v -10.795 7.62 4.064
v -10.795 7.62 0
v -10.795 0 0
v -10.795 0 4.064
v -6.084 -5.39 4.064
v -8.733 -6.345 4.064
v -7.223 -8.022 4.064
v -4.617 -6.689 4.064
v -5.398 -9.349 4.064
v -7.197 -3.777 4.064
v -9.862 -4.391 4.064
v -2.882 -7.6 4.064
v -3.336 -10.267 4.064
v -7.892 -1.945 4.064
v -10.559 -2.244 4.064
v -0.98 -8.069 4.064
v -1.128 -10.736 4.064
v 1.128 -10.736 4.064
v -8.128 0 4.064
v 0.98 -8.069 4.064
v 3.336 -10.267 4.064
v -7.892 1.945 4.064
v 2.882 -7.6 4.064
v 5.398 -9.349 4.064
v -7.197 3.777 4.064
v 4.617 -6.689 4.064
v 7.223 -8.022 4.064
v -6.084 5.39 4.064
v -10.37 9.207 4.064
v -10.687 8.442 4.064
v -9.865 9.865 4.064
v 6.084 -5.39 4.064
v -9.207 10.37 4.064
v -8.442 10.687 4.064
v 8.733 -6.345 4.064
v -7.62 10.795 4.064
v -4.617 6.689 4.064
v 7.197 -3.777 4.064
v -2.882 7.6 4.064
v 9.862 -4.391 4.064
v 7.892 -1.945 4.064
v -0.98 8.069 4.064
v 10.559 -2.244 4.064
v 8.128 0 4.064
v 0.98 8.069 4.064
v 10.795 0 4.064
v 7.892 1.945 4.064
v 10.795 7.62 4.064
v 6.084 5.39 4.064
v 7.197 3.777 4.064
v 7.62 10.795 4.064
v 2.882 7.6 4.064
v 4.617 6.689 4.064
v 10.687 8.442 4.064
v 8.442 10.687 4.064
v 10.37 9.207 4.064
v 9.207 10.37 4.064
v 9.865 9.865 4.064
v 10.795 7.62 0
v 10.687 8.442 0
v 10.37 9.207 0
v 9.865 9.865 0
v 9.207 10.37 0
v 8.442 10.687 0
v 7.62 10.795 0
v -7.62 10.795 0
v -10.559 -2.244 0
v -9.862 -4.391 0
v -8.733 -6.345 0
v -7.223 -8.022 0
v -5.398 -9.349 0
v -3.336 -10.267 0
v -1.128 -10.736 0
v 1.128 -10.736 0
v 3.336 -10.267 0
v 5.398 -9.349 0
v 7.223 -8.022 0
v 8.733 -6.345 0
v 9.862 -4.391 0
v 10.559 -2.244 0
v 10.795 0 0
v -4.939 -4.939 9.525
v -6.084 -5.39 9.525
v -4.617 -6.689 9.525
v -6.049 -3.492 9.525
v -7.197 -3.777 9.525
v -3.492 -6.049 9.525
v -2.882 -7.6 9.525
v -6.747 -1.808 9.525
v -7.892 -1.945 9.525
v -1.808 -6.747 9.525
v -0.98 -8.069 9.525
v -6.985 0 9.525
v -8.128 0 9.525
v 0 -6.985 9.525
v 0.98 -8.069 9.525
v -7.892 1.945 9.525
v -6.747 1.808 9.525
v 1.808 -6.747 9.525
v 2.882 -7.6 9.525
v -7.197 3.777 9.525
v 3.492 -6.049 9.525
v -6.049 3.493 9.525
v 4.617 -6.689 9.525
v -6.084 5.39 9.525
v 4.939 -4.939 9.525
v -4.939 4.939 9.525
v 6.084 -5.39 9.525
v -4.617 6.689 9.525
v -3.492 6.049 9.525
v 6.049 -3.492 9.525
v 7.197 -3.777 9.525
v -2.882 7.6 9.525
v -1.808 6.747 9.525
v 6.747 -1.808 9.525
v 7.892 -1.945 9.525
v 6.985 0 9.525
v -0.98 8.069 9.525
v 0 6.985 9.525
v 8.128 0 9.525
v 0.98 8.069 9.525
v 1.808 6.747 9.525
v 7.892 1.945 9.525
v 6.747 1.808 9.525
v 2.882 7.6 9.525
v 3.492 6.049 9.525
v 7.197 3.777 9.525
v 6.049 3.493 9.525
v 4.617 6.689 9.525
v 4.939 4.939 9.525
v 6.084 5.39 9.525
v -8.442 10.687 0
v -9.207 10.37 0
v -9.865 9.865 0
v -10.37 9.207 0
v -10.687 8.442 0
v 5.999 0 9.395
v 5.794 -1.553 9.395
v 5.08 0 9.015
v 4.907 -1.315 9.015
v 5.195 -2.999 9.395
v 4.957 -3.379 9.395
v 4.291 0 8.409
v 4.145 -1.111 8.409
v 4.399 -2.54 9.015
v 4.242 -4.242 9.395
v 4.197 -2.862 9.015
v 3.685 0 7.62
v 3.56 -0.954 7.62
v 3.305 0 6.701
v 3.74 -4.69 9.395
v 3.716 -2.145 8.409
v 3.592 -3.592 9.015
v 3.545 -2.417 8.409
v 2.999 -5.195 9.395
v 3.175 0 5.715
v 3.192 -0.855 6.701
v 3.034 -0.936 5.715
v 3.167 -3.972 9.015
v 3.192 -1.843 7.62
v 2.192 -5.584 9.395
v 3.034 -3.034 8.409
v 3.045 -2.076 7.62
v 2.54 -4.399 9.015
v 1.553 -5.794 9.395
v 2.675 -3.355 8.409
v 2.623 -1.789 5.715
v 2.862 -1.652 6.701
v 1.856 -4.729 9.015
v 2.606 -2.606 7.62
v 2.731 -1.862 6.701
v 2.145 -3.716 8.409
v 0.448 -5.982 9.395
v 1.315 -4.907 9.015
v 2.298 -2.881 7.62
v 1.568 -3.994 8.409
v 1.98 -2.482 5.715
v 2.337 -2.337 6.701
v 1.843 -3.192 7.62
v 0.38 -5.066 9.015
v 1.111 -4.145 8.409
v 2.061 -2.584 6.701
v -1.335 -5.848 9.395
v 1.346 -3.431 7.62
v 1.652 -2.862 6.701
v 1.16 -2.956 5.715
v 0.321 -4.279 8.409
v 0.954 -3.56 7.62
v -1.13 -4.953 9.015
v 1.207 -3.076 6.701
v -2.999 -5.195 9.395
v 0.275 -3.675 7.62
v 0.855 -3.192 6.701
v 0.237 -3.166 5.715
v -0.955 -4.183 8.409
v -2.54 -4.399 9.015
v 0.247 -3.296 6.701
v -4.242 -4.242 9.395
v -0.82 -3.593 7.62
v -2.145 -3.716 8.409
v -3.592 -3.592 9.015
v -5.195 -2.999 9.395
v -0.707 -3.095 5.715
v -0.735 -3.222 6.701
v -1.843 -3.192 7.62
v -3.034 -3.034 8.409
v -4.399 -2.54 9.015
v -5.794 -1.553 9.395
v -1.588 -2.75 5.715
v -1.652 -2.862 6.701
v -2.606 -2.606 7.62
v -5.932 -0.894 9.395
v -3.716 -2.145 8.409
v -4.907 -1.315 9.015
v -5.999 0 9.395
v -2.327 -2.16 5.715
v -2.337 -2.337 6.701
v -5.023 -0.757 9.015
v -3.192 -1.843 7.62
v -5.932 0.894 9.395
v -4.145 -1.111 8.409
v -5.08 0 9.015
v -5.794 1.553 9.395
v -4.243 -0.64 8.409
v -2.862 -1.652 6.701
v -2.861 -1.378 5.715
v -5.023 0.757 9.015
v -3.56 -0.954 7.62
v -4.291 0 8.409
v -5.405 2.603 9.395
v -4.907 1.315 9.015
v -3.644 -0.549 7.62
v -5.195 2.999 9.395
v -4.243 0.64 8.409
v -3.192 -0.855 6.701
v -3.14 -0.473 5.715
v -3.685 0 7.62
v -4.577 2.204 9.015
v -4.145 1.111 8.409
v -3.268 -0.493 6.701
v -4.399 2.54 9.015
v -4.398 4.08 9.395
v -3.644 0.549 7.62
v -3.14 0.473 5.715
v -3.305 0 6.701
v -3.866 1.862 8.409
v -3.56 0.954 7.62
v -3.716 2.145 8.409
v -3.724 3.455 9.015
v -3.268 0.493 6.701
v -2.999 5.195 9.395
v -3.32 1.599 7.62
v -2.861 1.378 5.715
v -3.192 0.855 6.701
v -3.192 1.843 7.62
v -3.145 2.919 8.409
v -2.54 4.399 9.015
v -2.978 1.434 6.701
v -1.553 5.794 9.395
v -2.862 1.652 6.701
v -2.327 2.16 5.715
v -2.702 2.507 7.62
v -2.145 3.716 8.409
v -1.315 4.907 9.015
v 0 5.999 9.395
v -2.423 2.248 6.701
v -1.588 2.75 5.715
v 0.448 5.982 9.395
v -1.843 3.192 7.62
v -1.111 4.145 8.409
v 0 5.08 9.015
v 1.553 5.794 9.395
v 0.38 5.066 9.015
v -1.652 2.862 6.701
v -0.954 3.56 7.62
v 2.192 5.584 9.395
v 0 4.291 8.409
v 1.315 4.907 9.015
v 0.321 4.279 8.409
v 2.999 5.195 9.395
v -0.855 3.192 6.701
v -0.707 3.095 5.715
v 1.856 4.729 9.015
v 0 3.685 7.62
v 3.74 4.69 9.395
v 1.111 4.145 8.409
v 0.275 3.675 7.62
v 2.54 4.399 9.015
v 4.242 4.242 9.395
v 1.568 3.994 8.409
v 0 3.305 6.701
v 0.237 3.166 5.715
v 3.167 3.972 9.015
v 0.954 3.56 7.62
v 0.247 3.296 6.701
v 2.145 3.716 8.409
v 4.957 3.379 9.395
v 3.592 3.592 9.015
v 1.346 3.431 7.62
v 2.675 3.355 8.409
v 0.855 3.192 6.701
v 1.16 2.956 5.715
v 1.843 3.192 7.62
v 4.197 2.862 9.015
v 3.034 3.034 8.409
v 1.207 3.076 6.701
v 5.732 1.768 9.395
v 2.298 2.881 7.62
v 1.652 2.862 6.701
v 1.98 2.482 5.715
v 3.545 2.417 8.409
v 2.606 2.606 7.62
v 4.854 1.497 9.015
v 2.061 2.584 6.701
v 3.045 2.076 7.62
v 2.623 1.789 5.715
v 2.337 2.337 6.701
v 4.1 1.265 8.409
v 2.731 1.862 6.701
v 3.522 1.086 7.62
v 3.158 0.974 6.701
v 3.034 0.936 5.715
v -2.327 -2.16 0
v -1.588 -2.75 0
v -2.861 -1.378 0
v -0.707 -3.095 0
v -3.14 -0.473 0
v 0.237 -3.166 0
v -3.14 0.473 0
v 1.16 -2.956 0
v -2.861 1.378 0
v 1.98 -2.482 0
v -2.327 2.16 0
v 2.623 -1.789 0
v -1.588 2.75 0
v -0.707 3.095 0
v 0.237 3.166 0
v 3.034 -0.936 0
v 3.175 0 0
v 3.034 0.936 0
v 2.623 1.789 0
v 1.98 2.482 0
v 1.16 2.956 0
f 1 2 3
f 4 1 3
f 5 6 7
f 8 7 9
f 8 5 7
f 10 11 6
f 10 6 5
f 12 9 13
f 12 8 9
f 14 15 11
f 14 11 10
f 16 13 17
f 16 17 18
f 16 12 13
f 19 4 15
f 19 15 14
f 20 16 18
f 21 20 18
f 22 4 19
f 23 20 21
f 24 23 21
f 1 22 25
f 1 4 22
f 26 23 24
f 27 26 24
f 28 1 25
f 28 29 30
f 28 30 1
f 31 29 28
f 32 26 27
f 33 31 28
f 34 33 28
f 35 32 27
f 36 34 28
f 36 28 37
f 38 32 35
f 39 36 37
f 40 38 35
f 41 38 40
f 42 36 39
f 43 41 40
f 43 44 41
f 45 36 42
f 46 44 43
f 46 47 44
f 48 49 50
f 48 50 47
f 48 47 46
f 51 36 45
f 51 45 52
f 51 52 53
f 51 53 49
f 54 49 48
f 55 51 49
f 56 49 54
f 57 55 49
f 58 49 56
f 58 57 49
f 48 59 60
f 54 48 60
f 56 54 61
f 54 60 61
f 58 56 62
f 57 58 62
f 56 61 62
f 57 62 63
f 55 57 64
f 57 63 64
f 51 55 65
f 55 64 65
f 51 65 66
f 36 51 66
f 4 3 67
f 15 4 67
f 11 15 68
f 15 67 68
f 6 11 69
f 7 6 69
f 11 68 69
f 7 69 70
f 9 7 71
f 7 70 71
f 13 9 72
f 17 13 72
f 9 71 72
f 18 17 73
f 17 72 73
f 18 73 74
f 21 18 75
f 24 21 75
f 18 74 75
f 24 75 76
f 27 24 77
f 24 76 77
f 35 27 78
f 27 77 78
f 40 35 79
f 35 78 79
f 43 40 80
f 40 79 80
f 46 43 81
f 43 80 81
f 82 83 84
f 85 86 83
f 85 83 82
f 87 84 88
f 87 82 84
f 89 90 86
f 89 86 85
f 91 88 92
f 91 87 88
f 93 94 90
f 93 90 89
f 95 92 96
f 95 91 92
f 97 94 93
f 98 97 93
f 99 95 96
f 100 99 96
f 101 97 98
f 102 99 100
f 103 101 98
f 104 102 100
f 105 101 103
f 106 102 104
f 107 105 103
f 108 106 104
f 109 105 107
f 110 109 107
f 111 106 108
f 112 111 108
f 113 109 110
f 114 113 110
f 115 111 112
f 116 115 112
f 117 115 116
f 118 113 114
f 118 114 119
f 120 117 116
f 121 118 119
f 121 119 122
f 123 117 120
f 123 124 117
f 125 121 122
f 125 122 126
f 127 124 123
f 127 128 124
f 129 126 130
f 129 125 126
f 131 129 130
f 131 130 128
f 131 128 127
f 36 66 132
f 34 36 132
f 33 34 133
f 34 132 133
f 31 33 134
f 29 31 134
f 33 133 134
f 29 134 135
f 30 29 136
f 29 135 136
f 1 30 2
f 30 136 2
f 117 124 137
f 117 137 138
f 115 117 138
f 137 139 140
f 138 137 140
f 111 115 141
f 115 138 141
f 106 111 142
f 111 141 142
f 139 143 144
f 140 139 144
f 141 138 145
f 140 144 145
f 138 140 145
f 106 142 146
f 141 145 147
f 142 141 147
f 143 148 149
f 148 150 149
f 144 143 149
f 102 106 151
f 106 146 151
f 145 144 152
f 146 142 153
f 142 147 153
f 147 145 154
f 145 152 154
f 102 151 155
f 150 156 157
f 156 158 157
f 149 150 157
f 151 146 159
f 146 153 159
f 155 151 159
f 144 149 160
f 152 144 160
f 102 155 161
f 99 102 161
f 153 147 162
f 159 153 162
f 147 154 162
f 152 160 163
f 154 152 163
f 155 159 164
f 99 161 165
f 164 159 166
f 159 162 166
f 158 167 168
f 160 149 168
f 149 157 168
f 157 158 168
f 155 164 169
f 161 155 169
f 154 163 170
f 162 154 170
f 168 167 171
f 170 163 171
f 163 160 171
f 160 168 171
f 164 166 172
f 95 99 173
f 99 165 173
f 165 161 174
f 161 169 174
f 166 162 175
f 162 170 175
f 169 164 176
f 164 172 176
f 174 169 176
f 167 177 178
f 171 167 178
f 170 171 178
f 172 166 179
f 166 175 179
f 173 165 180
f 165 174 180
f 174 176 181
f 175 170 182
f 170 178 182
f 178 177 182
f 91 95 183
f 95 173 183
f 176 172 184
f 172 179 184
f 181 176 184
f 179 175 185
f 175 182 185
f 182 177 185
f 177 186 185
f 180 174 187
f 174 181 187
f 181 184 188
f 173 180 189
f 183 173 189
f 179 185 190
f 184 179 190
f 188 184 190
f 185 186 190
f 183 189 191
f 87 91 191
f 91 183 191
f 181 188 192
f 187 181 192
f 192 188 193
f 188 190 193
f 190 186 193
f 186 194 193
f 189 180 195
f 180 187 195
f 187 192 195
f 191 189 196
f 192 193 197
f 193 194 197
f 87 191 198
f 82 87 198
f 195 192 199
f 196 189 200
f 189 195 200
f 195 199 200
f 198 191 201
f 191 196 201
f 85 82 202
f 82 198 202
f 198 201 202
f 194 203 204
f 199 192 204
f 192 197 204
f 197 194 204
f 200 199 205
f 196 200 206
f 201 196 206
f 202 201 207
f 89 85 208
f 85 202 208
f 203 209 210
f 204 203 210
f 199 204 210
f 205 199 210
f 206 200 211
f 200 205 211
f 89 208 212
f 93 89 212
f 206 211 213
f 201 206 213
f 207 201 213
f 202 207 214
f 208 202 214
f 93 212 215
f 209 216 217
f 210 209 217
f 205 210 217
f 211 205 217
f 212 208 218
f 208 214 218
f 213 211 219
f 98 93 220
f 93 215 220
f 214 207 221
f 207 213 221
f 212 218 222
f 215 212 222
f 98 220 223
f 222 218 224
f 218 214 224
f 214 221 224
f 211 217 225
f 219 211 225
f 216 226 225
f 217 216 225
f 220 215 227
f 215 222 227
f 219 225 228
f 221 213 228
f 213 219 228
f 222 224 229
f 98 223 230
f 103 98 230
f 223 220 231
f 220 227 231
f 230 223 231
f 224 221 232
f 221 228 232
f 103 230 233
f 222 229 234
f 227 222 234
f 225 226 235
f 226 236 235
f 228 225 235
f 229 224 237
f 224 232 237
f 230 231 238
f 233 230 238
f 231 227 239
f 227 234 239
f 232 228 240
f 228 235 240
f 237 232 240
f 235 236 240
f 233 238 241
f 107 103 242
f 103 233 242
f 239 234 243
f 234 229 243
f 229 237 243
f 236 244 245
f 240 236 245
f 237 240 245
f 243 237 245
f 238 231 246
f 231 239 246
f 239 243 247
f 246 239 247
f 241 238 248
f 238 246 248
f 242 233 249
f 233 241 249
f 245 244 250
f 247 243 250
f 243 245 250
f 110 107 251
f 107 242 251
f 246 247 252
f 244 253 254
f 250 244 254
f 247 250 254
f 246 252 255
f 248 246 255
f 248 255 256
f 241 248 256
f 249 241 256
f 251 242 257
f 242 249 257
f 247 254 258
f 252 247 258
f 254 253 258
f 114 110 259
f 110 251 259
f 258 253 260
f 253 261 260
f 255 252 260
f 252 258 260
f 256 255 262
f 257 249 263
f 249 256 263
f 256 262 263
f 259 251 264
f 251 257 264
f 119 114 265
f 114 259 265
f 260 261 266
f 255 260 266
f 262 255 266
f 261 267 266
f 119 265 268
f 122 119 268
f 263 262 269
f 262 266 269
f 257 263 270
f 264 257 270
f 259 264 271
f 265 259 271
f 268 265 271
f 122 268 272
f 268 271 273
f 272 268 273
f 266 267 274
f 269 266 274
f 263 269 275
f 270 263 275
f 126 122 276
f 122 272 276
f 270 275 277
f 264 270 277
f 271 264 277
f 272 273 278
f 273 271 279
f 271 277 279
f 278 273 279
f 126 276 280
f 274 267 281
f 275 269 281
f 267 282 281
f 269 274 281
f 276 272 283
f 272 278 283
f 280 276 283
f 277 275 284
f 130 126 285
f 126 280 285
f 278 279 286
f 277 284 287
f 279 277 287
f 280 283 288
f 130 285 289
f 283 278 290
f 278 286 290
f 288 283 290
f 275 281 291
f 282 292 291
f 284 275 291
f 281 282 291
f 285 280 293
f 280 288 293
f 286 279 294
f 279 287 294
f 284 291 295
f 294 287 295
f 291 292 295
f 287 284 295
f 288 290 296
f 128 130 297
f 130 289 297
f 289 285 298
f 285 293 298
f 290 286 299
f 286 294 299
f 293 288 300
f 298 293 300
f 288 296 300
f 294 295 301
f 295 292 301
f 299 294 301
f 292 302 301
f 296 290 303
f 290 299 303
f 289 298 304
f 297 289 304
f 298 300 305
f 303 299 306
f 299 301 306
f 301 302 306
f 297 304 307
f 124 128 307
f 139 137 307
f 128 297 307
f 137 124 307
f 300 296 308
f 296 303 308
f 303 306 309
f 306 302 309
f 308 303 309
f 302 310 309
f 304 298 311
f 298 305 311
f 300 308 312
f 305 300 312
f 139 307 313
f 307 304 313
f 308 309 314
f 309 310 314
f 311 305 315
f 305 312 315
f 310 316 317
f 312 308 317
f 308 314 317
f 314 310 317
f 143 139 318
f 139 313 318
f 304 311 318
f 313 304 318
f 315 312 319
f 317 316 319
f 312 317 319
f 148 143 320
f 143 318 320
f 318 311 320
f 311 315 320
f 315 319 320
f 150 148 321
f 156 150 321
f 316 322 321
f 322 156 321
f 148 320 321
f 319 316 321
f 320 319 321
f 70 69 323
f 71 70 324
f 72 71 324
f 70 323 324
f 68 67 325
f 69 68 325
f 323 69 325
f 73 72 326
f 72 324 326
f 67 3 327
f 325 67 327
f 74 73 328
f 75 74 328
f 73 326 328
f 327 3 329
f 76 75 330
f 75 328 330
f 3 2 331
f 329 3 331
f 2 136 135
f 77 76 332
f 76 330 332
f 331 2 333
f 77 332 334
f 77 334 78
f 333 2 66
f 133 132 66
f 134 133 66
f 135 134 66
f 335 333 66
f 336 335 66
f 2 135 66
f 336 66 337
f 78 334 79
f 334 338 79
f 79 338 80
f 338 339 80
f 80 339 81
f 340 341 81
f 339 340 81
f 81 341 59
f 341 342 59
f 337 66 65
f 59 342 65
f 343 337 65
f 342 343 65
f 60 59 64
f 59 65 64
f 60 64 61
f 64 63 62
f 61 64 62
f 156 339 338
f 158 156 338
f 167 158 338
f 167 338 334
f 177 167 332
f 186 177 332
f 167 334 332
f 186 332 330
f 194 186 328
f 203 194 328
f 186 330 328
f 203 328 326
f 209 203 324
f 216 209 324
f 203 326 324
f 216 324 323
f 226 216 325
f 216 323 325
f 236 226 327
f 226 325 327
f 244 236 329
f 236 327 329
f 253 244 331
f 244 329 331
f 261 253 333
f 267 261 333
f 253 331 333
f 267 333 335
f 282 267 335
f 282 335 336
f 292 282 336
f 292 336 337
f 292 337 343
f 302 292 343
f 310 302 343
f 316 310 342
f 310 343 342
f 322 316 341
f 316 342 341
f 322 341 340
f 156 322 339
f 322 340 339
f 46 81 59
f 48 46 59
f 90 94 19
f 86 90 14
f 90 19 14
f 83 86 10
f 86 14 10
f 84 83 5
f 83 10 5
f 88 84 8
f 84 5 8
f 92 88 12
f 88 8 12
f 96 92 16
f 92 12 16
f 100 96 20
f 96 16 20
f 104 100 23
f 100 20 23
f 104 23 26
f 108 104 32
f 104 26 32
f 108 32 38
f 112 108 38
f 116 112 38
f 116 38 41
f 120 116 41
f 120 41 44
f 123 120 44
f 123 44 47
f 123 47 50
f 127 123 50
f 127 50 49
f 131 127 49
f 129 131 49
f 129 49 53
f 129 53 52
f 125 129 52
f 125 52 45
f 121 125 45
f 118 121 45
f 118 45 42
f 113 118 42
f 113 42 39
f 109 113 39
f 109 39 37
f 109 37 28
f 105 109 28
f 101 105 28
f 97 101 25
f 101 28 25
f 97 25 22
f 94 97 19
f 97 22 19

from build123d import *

# Parameters (mm, degrees)
F1_DEPTH = 4.064
F2_DEPTH = 9.525
F3_R     = 3.81


with BuildPart() as f1:
    # F0 (on Top) → F1 (new body)
    with BuildSketch(Plane.XY):
        with BuildLine():
            Line((-8.128, 0), (-10.795, 0))
            ThreePointArc((-10.795, 0), (0, -10.795), (10.795, 0))
            Line((10.795, 0), (8.128, 0))
            ThreePointArc((8.128, 0), (0, -8.128), (-8.128, 0))
        make_face()
        with BuildLine():
            ThreePointArc((0, 10.795), (-7.633218, 7.633218), (-10.795, 0))
            Line((-10.795, 0), (-8.128, 0))
            ThreePointArc((-8.128, 0), (0, 8.128), (8.128, 0))
            Line((8.128, 0), (10.795, 0))
            ThreePointArc((10.795, 0), (7.633218, 7.633218), (0, 10.795))
        make_face()
        with BuildLine():
            Line((-10.795, 7.62), (-10.795, 0))
            ThreePointArc((-10.795, 0), (-7.633218, 7.633218), (0, 10.795))
            Line((0, 10.795), (-7.62, 10.795))
            ThreePointArc((-7.62, 10.795), (-9.865064, 9.865064), (-10.795, 7.62))
        make_face()
        with BuildLine():
            ThreePointArc((0, 10.795), (7.633218, 7.633218), (10.795, 0))
            Line((10.795, 0), (10.795, 7.62))
            ThreePointArc((10.795, 7.62), (9.865064, 9.865064), (7.62, 10.795))
            Line((7.62, 10.795), (0, 10.795))
        make_face()
    extrude(amount=F1_DEPTH)

    # F0 (on Top) → F2 (join)
    with BuildSketch(Plane.XY):
        with BuildLine():
            ThreePointArc((8.128, 0), (0, 8.128), (-8.128, 0))
            Line((-8.128, 0), (-3.175, 0))
            ThreePointArc((-3.175, 0), (0, 3.175), (3.175, 0))
            Line((3.175, 0), (8.128, 0))
        make_face()
        with BuildLine():
            Line((-3.175, 0), (-8.128, 0))
            ThreePointArc((-8.128, 0), (0, -8.128), (8.128, 0))
            Line((8.128, 0), (3.175, 0))
            ThreePointArc((3.175, 0), (0, -3.175), (-3.175, 0))
        make_face()
    extrude(amount=F2_DEPTH)

    # F3
    f3_edges = [f1.edges().sort_by_distance(p)[0] for p in [
        (-3.175, 0, 9.525),
    ]]
    fillet(f3_edges, radius=F3_R)


solid = f1.part
